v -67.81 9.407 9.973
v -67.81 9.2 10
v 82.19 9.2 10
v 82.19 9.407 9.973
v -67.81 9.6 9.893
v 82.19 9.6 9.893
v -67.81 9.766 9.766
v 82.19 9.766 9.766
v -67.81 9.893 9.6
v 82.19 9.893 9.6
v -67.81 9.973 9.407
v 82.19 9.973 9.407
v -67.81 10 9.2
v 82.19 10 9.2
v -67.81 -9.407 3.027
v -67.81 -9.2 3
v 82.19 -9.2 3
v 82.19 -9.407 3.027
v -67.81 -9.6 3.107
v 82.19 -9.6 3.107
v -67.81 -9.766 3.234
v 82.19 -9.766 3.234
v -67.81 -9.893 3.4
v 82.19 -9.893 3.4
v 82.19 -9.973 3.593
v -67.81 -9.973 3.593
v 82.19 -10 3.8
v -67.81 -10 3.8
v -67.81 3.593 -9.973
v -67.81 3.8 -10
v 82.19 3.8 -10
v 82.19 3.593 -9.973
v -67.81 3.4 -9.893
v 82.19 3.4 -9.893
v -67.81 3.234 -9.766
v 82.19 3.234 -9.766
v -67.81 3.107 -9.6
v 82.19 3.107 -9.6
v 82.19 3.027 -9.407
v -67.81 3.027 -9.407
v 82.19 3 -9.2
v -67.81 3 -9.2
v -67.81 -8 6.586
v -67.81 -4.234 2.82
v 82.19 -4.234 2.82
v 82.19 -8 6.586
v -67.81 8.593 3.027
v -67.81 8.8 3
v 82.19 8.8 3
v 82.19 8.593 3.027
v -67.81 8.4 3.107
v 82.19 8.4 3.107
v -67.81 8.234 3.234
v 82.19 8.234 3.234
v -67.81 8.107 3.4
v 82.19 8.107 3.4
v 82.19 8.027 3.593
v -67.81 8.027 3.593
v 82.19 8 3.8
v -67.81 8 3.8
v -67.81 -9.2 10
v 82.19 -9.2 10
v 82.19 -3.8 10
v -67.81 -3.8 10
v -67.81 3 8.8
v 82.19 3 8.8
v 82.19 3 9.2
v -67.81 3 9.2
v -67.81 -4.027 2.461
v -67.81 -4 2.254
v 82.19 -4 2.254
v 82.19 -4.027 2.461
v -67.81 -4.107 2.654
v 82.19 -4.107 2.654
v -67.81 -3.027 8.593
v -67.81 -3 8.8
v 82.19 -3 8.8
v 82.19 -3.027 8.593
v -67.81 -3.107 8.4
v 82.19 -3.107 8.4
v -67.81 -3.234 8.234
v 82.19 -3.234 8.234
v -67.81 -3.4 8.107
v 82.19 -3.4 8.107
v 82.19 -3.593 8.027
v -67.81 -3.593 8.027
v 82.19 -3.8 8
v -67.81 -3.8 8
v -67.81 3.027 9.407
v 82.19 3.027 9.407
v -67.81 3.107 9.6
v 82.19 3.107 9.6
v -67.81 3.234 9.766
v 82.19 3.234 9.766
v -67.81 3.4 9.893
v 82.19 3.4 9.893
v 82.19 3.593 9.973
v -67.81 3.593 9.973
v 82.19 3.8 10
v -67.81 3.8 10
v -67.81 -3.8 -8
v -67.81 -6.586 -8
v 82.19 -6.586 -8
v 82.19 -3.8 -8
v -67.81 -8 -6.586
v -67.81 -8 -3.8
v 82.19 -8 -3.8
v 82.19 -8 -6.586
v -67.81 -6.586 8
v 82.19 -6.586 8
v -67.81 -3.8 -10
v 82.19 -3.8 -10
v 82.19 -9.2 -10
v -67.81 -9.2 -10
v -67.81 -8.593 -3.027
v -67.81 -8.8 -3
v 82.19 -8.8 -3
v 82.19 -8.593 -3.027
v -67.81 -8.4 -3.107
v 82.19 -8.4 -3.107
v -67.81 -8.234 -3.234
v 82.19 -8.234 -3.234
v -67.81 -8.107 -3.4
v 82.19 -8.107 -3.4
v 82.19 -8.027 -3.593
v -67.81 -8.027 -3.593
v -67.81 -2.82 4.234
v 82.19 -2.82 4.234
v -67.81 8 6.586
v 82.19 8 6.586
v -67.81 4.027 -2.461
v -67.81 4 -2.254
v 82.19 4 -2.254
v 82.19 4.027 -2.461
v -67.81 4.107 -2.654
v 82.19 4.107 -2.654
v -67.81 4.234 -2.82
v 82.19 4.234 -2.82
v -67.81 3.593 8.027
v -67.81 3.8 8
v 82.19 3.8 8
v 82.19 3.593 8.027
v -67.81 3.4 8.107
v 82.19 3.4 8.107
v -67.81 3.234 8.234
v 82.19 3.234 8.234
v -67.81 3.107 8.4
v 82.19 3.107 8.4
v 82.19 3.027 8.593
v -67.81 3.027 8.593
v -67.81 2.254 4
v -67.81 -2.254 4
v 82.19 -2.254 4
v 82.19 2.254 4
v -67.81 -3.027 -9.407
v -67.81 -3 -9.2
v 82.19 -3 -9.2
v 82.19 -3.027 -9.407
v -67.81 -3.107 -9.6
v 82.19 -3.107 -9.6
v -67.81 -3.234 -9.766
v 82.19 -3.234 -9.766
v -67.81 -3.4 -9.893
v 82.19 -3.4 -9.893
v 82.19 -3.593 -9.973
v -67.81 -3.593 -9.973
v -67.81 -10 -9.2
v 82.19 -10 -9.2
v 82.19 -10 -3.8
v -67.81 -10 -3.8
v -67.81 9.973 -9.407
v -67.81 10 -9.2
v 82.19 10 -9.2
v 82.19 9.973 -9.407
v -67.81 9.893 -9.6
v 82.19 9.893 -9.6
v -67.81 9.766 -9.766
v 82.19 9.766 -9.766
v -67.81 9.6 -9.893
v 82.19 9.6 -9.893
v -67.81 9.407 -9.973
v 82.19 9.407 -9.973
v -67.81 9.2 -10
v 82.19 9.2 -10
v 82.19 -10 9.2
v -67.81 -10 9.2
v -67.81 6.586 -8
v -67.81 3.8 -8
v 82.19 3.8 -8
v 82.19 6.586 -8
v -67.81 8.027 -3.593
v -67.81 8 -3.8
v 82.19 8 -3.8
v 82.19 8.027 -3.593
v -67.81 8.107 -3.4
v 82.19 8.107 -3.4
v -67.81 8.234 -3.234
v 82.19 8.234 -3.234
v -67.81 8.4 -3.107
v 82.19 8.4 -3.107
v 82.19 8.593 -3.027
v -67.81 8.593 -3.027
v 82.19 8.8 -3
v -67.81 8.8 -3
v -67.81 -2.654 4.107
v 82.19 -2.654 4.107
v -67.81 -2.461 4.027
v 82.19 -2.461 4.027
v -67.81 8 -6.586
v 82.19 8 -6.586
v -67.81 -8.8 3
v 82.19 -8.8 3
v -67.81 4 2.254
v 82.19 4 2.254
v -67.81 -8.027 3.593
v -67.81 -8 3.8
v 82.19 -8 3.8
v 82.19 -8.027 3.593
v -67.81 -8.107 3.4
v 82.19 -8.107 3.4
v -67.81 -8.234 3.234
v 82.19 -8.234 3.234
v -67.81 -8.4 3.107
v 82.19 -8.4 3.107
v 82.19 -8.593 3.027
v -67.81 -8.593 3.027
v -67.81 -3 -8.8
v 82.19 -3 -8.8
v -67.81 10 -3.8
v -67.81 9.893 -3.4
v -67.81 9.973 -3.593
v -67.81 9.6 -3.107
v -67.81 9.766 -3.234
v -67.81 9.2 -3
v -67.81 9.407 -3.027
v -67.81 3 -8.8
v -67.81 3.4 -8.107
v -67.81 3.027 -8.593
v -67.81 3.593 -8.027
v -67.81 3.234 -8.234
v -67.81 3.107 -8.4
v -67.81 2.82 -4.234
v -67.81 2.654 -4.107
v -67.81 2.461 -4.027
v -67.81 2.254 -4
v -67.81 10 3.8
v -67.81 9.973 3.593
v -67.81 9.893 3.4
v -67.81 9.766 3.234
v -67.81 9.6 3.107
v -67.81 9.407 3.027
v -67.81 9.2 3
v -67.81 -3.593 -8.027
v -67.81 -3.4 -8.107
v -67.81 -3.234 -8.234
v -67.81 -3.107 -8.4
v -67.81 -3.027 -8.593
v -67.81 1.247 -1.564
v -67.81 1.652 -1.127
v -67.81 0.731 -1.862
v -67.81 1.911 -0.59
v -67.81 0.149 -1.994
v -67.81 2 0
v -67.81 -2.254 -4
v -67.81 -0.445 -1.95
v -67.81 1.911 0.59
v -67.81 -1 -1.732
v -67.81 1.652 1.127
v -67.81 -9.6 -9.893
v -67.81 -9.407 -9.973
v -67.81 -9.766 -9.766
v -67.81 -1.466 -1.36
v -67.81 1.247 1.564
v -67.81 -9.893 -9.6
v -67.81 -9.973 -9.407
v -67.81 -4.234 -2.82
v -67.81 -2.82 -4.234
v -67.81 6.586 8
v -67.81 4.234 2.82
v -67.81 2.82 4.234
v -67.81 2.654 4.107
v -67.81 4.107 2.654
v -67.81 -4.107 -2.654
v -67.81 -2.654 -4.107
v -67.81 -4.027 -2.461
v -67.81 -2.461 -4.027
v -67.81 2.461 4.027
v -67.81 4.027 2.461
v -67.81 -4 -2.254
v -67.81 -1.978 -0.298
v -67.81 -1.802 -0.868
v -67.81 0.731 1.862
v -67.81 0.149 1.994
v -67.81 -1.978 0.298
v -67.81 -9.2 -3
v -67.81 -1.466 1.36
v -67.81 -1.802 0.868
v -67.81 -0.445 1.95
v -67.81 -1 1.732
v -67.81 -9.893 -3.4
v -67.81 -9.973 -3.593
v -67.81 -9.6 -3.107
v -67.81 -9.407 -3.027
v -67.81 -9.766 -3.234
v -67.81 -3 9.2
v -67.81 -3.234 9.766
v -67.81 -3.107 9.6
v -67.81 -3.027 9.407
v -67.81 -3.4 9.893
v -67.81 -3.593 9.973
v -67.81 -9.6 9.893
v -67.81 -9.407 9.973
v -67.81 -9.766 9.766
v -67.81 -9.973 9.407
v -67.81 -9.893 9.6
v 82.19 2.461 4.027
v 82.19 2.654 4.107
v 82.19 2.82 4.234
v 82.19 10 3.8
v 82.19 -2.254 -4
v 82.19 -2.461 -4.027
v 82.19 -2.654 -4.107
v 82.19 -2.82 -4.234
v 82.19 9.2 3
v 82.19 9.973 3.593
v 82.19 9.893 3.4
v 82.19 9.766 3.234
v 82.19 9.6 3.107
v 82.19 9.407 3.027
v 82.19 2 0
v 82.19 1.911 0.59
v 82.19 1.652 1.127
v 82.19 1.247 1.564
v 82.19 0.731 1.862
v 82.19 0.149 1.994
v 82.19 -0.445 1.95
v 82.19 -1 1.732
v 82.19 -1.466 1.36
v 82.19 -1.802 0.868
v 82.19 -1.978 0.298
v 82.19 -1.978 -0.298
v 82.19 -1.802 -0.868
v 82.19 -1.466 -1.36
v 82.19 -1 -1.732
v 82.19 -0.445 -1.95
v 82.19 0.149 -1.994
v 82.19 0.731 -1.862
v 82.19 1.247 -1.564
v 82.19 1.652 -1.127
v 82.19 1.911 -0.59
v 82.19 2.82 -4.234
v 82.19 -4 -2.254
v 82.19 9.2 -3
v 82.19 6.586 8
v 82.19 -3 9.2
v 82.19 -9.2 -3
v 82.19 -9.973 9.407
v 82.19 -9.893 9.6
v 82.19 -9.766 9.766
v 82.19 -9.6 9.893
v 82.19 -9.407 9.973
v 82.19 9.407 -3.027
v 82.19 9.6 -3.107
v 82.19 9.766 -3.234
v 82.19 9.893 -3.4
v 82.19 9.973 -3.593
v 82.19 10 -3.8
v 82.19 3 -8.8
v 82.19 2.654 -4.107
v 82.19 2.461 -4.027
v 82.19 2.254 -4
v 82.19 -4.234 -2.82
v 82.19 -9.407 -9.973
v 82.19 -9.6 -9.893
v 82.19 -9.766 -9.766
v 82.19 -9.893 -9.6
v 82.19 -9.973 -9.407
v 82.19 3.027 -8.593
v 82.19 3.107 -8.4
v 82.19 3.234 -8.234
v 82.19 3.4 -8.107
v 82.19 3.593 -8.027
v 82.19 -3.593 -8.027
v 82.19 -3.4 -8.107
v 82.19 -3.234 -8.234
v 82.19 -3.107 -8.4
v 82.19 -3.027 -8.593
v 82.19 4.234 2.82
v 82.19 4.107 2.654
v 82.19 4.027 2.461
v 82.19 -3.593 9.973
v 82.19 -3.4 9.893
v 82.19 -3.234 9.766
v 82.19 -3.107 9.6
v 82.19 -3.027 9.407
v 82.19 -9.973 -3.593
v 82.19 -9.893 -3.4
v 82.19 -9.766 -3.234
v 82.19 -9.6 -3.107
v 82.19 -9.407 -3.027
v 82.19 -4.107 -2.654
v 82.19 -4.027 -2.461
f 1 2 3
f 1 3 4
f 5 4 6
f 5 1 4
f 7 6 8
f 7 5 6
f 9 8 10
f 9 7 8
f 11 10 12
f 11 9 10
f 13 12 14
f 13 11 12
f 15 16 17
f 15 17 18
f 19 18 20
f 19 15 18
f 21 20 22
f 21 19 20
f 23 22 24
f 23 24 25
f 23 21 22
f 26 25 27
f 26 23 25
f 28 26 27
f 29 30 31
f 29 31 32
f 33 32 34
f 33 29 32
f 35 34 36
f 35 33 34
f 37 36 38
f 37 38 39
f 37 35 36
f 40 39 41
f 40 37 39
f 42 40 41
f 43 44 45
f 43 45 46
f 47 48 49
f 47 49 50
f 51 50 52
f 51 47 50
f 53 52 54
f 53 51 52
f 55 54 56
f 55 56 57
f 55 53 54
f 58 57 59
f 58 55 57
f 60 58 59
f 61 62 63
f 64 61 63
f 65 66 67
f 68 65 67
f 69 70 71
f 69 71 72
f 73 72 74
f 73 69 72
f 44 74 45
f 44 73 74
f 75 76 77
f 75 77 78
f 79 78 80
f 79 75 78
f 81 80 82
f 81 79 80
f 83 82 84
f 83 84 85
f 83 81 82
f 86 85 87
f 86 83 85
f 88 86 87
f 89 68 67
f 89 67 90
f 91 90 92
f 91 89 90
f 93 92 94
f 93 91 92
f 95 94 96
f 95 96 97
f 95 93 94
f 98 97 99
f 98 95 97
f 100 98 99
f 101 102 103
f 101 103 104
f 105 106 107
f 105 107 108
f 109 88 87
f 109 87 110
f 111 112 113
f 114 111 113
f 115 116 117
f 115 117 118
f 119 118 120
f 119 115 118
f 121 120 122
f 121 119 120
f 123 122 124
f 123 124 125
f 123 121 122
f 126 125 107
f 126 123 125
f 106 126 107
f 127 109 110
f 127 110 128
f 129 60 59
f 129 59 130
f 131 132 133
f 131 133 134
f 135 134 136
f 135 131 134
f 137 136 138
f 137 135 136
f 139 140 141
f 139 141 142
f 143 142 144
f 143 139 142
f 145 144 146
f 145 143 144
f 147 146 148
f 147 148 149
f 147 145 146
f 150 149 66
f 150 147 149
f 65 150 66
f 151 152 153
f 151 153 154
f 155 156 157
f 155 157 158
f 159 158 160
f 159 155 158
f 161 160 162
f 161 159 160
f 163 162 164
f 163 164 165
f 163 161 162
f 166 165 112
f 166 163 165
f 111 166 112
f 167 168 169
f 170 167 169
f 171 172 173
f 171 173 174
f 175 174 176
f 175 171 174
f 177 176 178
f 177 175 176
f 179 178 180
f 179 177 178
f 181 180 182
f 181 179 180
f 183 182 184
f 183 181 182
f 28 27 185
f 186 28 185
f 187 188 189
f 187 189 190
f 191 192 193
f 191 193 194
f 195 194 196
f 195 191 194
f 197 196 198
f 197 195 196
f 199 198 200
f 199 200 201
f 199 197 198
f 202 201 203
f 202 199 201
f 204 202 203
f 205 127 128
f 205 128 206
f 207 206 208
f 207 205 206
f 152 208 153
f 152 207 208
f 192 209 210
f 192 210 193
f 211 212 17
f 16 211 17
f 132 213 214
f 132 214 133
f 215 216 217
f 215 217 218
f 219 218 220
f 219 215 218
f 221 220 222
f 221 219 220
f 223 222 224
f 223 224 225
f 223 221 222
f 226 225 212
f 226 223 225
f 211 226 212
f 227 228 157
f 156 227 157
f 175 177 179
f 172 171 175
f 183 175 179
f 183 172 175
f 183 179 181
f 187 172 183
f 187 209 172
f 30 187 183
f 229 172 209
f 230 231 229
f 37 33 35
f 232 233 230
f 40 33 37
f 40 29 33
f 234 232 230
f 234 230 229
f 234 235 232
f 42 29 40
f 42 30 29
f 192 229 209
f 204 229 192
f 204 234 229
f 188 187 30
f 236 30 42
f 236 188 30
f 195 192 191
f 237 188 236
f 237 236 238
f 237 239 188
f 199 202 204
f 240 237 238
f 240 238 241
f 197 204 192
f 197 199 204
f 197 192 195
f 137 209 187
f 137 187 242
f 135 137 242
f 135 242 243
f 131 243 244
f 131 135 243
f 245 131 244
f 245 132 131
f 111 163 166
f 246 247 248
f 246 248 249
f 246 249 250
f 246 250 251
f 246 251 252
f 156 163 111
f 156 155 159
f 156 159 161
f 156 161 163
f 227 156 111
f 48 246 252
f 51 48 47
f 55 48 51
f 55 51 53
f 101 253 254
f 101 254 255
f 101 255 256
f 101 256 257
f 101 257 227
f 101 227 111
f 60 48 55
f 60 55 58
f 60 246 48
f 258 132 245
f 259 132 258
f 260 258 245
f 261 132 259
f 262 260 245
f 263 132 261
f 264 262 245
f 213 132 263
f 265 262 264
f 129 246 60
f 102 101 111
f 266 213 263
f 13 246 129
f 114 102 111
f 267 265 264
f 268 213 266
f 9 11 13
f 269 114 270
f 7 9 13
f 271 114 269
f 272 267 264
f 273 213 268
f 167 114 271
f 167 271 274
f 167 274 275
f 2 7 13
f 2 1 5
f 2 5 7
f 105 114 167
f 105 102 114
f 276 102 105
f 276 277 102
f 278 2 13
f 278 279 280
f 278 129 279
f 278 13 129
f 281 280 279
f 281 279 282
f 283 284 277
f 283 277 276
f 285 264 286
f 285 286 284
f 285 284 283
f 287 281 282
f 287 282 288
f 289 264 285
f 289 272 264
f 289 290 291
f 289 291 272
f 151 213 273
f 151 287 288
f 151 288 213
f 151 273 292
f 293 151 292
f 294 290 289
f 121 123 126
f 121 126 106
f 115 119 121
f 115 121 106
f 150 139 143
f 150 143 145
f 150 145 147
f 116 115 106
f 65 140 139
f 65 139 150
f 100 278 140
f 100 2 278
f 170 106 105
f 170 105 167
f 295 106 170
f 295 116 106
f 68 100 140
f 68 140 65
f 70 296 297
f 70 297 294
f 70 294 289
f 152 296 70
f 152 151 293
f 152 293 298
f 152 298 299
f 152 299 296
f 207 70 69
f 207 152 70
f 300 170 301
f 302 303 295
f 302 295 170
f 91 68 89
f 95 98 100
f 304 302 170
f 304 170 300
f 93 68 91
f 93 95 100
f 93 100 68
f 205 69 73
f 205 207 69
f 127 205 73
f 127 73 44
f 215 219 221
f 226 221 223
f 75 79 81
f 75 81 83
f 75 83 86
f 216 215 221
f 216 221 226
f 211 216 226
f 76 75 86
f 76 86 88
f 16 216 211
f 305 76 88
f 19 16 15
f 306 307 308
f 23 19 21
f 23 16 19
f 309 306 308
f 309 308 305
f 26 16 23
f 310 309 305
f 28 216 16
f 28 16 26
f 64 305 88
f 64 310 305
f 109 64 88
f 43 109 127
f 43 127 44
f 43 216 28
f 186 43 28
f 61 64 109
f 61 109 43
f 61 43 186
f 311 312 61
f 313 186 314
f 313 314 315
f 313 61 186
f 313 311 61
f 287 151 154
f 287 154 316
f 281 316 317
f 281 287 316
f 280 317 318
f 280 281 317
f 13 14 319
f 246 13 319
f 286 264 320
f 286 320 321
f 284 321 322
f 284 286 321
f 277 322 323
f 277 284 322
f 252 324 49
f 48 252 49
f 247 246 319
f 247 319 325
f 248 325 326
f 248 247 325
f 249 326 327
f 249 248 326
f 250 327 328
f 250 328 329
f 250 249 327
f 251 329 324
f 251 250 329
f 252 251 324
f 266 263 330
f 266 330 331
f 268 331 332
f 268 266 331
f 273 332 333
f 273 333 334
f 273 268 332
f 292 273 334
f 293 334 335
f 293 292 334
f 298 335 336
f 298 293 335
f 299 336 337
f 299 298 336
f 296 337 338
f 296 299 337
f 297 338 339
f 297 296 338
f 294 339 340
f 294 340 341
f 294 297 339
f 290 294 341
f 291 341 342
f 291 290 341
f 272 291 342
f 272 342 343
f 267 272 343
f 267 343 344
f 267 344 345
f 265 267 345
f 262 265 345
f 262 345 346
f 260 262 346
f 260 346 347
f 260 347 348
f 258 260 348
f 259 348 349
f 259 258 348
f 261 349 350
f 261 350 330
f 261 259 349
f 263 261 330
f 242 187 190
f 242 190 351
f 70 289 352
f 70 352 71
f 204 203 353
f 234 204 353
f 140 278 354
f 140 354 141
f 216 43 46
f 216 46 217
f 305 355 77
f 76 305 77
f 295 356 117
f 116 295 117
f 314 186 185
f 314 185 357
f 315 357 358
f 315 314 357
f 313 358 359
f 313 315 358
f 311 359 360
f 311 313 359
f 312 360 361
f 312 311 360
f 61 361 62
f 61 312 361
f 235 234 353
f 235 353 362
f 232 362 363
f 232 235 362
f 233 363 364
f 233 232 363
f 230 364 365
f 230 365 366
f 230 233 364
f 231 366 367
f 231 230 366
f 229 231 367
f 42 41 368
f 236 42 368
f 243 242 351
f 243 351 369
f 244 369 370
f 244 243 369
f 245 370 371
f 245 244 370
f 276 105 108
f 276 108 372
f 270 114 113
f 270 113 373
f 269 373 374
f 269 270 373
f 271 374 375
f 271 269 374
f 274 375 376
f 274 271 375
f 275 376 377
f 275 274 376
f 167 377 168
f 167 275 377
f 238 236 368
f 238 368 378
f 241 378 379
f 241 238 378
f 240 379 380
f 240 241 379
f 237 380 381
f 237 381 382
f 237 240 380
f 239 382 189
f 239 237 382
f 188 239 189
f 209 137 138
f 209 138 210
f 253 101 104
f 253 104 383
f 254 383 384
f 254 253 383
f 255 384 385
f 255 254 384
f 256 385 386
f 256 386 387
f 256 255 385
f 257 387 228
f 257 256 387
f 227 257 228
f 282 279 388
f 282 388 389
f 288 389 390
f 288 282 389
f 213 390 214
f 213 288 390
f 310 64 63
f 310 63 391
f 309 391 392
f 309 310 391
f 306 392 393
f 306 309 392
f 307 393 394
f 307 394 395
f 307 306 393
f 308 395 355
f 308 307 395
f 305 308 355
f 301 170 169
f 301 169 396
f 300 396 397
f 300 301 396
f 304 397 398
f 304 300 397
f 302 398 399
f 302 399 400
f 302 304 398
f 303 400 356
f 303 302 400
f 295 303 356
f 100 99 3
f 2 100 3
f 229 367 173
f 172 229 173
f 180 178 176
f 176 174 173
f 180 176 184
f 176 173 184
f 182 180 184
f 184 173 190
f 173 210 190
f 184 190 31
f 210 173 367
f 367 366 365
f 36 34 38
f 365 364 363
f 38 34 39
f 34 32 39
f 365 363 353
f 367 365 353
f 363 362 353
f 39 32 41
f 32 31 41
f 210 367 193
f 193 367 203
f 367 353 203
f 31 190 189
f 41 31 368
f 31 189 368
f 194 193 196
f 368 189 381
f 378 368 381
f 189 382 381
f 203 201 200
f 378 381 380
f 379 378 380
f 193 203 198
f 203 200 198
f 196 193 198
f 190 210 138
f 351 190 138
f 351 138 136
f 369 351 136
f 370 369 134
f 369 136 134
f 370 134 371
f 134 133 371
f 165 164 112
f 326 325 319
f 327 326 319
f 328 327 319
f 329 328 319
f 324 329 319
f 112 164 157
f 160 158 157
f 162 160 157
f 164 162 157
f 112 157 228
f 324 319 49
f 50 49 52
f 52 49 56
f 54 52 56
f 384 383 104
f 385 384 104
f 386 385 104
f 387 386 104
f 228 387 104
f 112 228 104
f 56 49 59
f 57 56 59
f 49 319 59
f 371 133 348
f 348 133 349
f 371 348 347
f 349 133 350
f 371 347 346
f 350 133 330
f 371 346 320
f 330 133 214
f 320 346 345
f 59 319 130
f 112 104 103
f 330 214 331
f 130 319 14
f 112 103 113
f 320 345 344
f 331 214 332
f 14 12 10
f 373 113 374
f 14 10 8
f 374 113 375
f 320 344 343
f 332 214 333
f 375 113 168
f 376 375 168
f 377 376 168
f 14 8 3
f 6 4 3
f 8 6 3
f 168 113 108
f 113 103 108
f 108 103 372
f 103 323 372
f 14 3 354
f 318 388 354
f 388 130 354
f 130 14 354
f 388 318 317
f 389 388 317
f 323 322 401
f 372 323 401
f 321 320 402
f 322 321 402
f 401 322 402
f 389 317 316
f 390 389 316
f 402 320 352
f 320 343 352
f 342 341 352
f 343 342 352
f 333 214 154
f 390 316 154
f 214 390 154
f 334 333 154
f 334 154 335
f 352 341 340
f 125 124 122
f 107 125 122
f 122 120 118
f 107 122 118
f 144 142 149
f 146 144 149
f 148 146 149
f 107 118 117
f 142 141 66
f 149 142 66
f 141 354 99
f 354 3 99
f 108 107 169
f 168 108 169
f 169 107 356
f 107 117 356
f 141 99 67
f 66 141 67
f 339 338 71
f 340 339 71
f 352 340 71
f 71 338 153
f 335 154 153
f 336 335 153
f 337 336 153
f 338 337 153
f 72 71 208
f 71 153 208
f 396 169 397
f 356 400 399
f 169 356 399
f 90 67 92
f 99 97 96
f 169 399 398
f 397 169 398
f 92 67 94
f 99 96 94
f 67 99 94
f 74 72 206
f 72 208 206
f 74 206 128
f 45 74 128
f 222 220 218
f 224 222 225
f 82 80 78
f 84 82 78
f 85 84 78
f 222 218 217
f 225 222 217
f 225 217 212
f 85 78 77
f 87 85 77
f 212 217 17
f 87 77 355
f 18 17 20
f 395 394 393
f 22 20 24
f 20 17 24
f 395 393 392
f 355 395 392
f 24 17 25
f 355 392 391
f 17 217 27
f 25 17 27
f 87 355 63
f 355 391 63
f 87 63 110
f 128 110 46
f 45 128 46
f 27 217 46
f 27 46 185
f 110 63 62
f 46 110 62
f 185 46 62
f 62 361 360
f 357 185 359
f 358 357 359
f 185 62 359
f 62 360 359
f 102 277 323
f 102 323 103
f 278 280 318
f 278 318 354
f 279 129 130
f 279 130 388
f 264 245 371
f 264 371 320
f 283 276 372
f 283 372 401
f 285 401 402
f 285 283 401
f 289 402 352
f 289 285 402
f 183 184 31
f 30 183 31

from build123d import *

# Parameters (mm, degrees)
SKETCH1_R           = 2
PROFILE_4X4_1_DEPTH = 150


with BuildPart() as part:
    # Sketch1 → Profile 4X4(1) (new body)
    with BuildSketch(Plane.YZ.offset(-67.810457516)):
        with BuildLine():
            Line((-3, 9.2), (-3, 8.8))
            ThreePointArc((-3, 8.8), (-3.234314575, 8.234314575), (-3.8, 8))
            Line((-3.8, 8), (-6.585786438, 8))
            Line((-6.585786438, 8), (-2.820101013, 4.234314575))
            ThreePointArc((-2.820101013, 4.234314575), (-2.560562334, 4.060896374), (-2.254415588, 4))
            Line((-2.254415588, 4), (2.254415588, 4))
            ThreePointArc((2.254415588, 4), (2.560562334, 4.060896374), (2.820101013, 4.234314575))
            Line((2.820101013, 4.234314575), (6.585786438, 8))
            Line((6.585786438, 8), (3.8, 8))
            ThreePointArc((3.8, 8), (3.234314575, 8.234314575), (3, 8.8))
            Line((3, 8.8), (3, 9.2))
            ThreePointArc((3, 9.2), (3.234314575, 9.765685425), (3.8, 10))
            Line((3.8, 10), (9.2, 10))
            ThreePointArc((9.2, 10), (9.765685425, 9.765685425), (10, 9.2))
            Line((10, 9.2), (10, 3.8))
            ThreePointArc((10, 3.8), (9.765685425, 3.234314575), (9.2, 3))
            Line((9.2, 3), (8.8, 3))
            ThreePointArc((8.8, 3), (8.234314575, 3.234314575), (8, 3.8))
            Line((8, 3.8), (8, 6.585786438))
            Line((8, 6.585786438), (4.234314575, 2.820101013))
            ThreePointArc((4.234314575, 2.820101013), (4.060896374, 2.560562334), (4, 2.254415588))
            Line((4, 2.254415588), (4, -2.254415588))
            ThreePointArc((4, -2.254415588), (4.060896374, -2.560562334), (4.234314575, -2.820101013))
            Line((4.234314575, -2.820101013), (8, -6.585786438))
            Line((8, -6.585786438), (8, -3.8))
            ThreePointArc((8, -3.8), (8.234314575, -3.234314575), (8.8, -3))
            Line((8.8, -3), (9.2, -3))
            ThreePointArc((9.2, -3), (9.765685425, -3.234314575), (10, -3.8))
            Line((10, -3.8), (10, -9.2))
            ThreePointArc((10, -9.2), (9.765685425, -9.765685425), (9.2, -10))
            Line((9.2, -10), (3.8, -10))
            ThreePointArc((3.8, -10), (3.234314575, -9.765685425), (3, -9.2))
            Line((3, -9.2), (3, -8.8))
            ThreePointArc((3, -8.8), (3.234314575, -8.234314575), (3.8, -8))
            Line((3.8, -8), (6.585786438, -8))
            Line((6.585786438, -8), (2.820101013, -4.234314575))
            ThreePointArc((2.820101013, -4.234314575), (2.560562334, -4.060896374), (2.254415588, -4))
            Line((2.254415588, -4), (-2.254415588, -4))
            ThreePointArc((-2.254415588, -4), (-2.560562334, -4.060896374), (-2.820101013, -4.234314575))
            Line((-2.820101013, -4.234314575), (-6.585786438, -8))
            Line((-6.585786438, -8), (-3.8, -8))
            ThreePointArc((-3.8, -8), (-3.234314575, -8.234314575), (-3, -8.8))
            Line((-3, -8.8), (-3, -9.2))
            ThreePointArc((-3, -9.2), (-3.234314575, -9.765685425), (-3.8, -10))
            Line((-3.8, -10), (-9.2, -10))
            ThreePointArc((-9.2, -10), (-9.765685425, -9.765685425), (-10, -9.2))
            Line((-10, -9.2), (-10, -3.8))
            ThreePointArc((-10, -3.8), (-9.765685425, -3.234314575), (-9.2, -3))
            Line((-9.2, -3), (-8.8, -3))
            ThreePointArc((-8.8, -3), (-8.234314575, -3.234314575), (-8, -3.8))
            Line((-8, -3.8), (-8, -6.585786438))
            Line((-8, -6.585786438), (-4.234314575, -2.820101013))
            ThreePointArc((-4.234314575, -2.820101013), (-4.060896374, -2.560562334), (-4, -2.254415588))
            Line((-4, -2.254415588), (-4, 2.254415588))
            ThreePointArc((-4, 2.254415588), (-4.060896374, 2.560562334), (-4.234314575, 2.820101013))
            Line((-4.234314575, 2.820101013), (-8, 6.585786438))
            Line((-8, 6.585786438), (-8, 3.8))
            ThreePointArc((-8, 3.8), (-8.234314575, 3.234314575), (-8.8, 3))
            Line((-8.8, 3), (-9.2, 3))
            ThreePointArc((-9.2, 3), (-9.765685425, 3.234314575), (-10, 3.8))
            Line((-10, 3.8), (-10, 9.2))
            ThreePointArc((-10, 9.2), (-9.765685425, 9.765685425), (-9.2, 10))
            Line((-9.2, 10), (-3.8, 10))
            ThreePointArc((-3.8, 10), (-3.234314575, 9.765685425), (-3, 9.2))
        make_face()
        Circle(SKETCH1_R, mode=Mode.SUBTRACT)
    extrude(amount=PROFILE_4X4_1_DEPTH)


solid = part.part
